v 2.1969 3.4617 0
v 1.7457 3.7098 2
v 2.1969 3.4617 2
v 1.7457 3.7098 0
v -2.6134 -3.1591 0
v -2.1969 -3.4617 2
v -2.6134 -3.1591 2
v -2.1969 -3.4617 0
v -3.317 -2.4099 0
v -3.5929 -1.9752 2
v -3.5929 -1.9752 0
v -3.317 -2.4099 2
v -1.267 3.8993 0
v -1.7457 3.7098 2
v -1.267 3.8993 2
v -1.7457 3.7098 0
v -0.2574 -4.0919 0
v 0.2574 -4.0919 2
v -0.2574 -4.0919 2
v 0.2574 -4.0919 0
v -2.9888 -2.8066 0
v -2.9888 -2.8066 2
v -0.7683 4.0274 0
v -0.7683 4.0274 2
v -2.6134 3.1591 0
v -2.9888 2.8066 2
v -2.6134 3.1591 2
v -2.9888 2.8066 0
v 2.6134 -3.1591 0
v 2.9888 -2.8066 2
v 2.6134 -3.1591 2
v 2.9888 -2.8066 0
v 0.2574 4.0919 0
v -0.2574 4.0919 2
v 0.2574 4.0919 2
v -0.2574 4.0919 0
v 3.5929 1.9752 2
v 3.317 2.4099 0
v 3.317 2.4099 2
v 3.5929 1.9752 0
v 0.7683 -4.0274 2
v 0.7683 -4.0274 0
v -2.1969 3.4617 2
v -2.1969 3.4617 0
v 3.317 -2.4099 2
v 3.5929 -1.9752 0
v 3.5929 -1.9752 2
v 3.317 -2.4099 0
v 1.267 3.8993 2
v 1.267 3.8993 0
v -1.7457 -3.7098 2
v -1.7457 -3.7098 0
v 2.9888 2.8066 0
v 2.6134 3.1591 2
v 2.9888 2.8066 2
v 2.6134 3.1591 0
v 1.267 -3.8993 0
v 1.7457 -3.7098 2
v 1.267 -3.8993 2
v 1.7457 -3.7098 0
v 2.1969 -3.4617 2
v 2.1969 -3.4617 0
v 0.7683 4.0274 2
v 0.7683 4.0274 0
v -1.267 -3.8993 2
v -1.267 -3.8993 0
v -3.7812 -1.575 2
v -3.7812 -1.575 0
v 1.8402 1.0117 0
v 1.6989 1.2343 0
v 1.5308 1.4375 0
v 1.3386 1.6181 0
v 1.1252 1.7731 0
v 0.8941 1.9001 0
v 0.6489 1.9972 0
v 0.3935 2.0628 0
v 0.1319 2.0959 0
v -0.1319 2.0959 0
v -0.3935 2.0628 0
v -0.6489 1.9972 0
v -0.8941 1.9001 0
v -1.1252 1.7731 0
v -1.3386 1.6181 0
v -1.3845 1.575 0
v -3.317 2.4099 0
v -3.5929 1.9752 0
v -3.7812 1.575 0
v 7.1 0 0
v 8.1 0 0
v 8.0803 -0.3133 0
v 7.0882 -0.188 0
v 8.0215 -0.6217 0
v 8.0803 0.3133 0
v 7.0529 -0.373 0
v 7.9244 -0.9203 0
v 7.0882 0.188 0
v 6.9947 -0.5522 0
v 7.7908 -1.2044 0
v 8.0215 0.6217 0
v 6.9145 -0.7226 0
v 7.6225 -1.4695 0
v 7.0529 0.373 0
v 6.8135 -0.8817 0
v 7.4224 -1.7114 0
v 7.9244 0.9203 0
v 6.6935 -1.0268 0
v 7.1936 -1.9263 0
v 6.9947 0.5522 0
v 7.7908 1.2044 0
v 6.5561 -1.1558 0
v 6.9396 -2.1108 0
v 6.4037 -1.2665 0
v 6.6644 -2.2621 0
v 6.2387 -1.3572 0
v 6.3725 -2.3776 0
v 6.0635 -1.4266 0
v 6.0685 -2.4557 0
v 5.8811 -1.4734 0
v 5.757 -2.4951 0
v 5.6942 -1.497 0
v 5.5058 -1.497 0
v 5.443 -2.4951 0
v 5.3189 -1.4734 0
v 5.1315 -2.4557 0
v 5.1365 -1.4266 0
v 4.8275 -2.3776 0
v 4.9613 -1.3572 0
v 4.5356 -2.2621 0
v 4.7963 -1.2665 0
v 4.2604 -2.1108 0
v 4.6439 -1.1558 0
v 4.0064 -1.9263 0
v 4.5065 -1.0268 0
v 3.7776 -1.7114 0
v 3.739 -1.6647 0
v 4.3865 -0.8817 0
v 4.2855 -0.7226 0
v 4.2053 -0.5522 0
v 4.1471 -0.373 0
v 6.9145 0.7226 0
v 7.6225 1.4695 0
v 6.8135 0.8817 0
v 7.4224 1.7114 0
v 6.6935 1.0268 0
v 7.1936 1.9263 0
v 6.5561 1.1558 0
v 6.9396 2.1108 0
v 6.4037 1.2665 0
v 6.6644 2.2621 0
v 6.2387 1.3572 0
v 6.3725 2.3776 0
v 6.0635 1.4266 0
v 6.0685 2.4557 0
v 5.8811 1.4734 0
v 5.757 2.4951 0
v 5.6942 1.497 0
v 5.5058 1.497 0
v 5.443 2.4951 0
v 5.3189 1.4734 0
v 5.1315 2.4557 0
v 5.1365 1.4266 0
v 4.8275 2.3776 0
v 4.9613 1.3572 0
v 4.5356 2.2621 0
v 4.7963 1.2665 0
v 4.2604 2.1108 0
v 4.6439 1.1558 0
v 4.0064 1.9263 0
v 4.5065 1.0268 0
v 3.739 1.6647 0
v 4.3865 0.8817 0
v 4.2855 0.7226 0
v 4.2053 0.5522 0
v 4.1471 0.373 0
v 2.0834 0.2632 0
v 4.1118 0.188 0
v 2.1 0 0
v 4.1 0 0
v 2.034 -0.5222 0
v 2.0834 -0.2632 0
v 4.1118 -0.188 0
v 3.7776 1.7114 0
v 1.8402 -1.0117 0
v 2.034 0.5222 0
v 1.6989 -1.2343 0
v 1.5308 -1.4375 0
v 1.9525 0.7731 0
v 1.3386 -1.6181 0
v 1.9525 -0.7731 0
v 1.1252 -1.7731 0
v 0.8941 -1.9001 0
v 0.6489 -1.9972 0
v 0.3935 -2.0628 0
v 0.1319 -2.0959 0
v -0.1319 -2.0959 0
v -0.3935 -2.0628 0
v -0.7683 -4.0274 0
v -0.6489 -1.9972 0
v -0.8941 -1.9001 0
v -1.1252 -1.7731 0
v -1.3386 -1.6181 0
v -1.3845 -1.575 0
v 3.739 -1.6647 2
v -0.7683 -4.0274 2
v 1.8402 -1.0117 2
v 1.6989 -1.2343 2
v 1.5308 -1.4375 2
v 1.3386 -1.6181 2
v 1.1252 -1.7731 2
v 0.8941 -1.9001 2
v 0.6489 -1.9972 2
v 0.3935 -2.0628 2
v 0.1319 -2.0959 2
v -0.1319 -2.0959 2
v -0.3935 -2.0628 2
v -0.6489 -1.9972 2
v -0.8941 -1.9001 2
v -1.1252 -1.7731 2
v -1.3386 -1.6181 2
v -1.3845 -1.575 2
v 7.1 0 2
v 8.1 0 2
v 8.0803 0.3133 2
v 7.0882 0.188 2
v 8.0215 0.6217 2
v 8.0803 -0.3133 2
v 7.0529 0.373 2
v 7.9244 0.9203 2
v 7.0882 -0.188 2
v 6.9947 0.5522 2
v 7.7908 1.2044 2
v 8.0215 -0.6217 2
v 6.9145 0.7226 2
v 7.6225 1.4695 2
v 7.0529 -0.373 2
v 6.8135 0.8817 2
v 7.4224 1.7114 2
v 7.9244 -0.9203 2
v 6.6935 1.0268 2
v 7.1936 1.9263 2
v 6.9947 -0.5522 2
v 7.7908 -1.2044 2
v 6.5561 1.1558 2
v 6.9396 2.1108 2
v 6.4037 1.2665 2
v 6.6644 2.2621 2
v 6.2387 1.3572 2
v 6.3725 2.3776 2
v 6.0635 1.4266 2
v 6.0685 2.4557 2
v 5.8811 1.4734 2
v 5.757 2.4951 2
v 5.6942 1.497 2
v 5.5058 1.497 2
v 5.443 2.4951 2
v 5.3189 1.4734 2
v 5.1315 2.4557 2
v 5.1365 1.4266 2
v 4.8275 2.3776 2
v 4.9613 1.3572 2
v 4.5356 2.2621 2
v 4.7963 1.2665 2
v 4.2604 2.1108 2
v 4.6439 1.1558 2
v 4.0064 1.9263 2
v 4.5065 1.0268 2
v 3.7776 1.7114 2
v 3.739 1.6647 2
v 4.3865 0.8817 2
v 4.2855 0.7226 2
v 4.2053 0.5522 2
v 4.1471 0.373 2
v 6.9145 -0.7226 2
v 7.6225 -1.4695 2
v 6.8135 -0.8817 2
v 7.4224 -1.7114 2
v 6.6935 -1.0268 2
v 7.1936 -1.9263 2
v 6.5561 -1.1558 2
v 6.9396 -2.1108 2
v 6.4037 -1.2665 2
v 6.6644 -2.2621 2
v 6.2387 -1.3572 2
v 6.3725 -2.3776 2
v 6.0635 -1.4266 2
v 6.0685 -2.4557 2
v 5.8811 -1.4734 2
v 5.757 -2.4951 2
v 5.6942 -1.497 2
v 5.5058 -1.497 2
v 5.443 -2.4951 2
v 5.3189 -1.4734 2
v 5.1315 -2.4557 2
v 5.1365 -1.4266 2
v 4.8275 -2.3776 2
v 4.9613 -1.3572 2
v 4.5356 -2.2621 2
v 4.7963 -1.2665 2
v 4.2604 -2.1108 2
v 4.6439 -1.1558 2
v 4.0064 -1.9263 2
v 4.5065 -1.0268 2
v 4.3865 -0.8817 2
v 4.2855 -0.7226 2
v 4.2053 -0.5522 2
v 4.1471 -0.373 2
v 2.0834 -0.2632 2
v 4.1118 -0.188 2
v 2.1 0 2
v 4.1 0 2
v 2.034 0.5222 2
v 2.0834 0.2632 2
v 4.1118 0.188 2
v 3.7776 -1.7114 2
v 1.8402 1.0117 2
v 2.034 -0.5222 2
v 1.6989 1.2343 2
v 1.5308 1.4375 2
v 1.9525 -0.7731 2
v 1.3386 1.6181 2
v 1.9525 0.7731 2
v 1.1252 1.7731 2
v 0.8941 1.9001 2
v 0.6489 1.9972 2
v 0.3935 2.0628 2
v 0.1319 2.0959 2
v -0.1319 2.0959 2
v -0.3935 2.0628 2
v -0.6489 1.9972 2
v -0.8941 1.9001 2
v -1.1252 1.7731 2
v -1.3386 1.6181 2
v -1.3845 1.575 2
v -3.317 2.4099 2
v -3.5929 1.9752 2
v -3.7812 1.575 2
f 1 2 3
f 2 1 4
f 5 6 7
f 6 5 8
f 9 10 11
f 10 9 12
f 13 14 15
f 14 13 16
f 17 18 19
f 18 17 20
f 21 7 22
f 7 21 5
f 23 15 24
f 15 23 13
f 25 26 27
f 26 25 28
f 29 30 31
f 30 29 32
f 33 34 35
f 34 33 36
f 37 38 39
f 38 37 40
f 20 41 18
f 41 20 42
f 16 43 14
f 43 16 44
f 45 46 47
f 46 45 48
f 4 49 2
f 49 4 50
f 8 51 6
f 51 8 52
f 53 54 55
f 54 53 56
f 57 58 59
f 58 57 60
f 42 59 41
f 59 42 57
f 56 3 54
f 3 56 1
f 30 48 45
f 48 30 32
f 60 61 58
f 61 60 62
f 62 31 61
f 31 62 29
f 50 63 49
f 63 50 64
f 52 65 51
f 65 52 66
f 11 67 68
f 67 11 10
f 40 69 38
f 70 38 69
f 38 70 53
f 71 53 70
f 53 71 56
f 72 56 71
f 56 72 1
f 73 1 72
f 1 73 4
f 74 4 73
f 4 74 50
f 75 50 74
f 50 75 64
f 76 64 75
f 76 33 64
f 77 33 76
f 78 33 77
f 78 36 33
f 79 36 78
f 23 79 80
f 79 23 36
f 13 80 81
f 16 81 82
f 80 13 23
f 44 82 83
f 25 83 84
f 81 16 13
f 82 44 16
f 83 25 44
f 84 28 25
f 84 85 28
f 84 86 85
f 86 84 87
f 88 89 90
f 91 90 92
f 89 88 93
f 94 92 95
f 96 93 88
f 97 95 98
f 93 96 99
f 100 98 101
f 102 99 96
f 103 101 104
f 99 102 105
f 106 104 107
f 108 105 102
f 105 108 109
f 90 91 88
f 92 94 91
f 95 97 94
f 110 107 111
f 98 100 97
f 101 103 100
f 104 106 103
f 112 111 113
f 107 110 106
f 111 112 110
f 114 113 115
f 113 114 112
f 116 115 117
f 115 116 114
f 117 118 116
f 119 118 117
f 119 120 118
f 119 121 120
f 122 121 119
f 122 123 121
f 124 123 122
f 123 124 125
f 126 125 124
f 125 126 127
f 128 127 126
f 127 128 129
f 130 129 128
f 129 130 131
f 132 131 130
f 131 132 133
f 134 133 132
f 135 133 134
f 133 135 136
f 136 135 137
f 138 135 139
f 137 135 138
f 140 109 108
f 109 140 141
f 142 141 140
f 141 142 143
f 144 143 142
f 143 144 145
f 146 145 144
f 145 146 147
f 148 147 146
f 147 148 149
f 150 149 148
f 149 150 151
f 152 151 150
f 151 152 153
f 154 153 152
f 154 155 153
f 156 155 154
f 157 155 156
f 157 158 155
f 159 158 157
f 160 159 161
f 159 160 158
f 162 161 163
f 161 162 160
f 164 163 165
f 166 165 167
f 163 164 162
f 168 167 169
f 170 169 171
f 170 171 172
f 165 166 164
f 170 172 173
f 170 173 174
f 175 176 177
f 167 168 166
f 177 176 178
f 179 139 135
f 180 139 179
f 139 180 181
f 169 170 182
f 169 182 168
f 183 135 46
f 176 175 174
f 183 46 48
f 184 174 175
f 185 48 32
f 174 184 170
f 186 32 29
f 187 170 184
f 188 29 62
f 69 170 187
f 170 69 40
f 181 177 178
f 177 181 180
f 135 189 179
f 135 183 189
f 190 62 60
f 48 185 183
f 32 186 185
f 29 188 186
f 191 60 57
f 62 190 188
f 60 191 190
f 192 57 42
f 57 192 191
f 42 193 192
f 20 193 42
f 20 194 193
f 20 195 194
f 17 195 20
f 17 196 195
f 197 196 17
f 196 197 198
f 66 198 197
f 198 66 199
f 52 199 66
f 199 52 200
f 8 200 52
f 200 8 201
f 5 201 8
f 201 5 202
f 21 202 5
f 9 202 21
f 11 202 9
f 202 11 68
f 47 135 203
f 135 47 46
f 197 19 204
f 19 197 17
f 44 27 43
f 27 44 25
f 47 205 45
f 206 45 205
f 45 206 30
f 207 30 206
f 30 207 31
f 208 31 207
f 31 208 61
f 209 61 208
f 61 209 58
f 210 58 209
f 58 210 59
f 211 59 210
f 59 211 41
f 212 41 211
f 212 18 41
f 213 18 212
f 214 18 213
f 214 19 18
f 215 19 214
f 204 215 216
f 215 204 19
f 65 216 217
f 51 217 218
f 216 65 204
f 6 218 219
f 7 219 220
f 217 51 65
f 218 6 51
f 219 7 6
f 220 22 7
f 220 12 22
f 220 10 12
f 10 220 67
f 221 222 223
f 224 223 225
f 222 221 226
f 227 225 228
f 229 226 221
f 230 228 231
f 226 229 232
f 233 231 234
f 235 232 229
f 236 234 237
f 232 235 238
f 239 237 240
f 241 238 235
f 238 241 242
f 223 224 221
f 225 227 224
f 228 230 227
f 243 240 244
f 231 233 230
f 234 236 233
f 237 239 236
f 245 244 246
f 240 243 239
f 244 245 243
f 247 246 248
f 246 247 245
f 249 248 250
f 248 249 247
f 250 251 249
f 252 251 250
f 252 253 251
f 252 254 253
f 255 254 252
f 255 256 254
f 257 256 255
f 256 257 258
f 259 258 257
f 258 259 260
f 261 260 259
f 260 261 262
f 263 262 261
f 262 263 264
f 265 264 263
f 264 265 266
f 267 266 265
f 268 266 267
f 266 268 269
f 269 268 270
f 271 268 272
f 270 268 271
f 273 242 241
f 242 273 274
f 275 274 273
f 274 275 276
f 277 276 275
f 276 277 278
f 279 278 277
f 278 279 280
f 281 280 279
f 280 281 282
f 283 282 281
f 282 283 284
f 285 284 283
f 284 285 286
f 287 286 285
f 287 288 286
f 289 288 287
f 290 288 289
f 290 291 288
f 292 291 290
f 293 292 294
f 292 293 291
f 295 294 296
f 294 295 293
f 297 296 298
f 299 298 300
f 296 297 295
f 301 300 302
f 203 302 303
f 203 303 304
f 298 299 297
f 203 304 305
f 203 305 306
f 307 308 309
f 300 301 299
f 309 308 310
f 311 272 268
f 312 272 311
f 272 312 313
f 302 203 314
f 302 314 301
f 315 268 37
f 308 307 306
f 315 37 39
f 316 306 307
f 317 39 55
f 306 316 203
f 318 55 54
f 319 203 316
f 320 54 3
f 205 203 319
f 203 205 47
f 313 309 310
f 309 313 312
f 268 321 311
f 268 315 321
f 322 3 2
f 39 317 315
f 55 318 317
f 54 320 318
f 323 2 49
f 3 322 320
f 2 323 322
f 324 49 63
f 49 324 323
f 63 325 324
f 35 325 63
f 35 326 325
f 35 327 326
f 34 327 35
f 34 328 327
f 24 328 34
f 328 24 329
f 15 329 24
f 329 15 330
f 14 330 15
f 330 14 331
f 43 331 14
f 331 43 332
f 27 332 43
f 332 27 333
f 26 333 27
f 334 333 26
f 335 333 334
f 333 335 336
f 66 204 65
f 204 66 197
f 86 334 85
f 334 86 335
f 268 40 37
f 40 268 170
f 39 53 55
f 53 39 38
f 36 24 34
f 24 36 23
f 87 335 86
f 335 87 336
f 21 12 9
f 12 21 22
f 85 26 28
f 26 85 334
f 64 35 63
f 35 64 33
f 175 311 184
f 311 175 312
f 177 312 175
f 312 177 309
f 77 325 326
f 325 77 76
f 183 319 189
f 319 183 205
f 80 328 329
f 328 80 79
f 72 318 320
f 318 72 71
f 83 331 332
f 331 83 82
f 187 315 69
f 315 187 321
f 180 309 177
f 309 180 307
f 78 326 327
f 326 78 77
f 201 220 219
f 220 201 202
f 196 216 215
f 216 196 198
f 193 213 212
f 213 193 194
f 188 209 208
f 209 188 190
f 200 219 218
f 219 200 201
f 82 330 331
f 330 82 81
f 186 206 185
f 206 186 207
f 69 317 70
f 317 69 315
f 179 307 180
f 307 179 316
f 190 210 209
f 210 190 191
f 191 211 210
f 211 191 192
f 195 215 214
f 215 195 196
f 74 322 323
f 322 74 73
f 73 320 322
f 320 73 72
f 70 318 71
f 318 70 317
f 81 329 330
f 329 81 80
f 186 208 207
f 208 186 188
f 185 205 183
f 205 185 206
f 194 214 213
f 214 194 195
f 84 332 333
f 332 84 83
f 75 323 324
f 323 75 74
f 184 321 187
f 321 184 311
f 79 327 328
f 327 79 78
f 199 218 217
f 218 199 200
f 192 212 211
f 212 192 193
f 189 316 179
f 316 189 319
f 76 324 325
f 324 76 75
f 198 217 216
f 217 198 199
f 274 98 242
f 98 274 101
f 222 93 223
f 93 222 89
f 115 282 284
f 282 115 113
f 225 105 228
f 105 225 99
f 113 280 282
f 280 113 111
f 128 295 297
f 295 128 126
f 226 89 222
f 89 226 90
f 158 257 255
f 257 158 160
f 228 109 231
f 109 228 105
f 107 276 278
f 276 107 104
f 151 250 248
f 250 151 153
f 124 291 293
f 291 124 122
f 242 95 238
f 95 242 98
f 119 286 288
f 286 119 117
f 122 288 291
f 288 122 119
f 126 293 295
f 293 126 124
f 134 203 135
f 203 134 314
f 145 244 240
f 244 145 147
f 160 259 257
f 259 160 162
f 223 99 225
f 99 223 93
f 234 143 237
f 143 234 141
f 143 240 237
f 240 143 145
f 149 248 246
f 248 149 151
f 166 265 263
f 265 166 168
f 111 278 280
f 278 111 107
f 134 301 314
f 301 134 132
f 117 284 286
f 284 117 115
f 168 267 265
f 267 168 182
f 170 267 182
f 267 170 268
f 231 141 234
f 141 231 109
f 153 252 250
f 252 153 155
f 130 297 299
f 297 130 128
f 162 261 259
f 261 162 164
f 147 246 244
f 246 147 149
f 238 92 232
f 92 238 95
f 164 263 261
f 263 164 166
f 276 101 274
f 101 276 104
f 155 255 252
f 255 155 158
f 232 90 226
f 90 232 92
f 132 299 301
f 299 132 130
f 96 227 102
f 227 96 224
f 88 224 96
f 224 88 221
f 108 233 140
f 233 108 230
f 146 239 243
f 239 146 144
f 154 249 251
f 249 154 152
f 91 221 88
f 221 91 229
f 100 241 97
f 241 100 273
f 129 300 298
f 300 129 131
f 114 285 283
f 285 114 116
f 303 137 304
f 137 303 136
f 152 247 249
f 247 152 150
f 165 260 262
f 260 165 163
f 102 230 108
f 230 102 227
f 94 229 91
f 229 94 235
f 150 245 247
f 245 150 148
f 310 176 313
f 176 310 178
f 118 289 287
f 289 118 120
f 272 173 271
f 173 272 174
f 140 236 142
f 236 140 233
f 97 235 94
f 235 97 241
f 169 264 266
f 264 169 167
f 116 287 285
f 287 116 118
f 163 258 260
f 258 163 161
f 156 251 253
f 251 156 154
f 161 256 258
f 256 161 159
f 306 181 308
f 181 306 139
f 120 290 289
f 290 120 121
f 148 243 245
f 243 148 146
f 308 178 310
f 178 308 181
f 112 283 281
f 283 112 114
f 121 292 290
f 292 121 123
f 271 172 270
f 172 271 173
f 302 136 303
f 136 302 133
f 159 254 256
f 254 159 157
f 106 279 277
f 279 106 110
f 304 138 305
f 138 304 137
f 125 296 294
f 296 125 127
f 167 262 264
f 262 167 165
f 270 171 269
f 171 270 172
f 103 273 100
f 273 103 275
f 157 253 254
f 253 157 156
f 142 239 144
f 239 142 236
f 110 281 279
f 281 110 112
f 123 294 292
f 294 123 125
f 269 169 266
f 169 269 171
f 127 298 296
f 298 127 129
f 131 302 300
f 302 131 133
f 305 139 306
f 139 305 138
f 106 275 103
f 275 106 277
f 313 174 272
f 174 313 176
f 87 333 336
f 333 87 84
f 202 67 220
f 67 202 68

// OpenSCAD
ROD_DIA = 4.2;
SPRING_LOOP_DIA = 3;
THICKNESS = 2;
CLAMPING_FACTOR = 0.75;

$fn = 50;

module ring(outer_dia, inner_dia, height) {
    difference() {
        cylinder(d = outer_dia, h = height);
        cylinder(d = inner_dia, h = height);
    }
}

difference() {
    union() {
        d = ROD_DIA + 2 * THICKNESS;
        ring(d, ROD_DIA, THICKNESS);

        translate([d/2 + SPRING_LOOP_DIA/2, 0, 0])
        ring(SPRING_LOOP_DIA + THICKNESS, SPRING_LOOP_DIA, THICKNESS);
    }
    translate([-ROD_DIA/2, 0, 0])
    cube(size = [2 * THICKNESS, ROD_DIA * CLAMPING_FACTOR, 2 * THICKNESS], center = true);
}
